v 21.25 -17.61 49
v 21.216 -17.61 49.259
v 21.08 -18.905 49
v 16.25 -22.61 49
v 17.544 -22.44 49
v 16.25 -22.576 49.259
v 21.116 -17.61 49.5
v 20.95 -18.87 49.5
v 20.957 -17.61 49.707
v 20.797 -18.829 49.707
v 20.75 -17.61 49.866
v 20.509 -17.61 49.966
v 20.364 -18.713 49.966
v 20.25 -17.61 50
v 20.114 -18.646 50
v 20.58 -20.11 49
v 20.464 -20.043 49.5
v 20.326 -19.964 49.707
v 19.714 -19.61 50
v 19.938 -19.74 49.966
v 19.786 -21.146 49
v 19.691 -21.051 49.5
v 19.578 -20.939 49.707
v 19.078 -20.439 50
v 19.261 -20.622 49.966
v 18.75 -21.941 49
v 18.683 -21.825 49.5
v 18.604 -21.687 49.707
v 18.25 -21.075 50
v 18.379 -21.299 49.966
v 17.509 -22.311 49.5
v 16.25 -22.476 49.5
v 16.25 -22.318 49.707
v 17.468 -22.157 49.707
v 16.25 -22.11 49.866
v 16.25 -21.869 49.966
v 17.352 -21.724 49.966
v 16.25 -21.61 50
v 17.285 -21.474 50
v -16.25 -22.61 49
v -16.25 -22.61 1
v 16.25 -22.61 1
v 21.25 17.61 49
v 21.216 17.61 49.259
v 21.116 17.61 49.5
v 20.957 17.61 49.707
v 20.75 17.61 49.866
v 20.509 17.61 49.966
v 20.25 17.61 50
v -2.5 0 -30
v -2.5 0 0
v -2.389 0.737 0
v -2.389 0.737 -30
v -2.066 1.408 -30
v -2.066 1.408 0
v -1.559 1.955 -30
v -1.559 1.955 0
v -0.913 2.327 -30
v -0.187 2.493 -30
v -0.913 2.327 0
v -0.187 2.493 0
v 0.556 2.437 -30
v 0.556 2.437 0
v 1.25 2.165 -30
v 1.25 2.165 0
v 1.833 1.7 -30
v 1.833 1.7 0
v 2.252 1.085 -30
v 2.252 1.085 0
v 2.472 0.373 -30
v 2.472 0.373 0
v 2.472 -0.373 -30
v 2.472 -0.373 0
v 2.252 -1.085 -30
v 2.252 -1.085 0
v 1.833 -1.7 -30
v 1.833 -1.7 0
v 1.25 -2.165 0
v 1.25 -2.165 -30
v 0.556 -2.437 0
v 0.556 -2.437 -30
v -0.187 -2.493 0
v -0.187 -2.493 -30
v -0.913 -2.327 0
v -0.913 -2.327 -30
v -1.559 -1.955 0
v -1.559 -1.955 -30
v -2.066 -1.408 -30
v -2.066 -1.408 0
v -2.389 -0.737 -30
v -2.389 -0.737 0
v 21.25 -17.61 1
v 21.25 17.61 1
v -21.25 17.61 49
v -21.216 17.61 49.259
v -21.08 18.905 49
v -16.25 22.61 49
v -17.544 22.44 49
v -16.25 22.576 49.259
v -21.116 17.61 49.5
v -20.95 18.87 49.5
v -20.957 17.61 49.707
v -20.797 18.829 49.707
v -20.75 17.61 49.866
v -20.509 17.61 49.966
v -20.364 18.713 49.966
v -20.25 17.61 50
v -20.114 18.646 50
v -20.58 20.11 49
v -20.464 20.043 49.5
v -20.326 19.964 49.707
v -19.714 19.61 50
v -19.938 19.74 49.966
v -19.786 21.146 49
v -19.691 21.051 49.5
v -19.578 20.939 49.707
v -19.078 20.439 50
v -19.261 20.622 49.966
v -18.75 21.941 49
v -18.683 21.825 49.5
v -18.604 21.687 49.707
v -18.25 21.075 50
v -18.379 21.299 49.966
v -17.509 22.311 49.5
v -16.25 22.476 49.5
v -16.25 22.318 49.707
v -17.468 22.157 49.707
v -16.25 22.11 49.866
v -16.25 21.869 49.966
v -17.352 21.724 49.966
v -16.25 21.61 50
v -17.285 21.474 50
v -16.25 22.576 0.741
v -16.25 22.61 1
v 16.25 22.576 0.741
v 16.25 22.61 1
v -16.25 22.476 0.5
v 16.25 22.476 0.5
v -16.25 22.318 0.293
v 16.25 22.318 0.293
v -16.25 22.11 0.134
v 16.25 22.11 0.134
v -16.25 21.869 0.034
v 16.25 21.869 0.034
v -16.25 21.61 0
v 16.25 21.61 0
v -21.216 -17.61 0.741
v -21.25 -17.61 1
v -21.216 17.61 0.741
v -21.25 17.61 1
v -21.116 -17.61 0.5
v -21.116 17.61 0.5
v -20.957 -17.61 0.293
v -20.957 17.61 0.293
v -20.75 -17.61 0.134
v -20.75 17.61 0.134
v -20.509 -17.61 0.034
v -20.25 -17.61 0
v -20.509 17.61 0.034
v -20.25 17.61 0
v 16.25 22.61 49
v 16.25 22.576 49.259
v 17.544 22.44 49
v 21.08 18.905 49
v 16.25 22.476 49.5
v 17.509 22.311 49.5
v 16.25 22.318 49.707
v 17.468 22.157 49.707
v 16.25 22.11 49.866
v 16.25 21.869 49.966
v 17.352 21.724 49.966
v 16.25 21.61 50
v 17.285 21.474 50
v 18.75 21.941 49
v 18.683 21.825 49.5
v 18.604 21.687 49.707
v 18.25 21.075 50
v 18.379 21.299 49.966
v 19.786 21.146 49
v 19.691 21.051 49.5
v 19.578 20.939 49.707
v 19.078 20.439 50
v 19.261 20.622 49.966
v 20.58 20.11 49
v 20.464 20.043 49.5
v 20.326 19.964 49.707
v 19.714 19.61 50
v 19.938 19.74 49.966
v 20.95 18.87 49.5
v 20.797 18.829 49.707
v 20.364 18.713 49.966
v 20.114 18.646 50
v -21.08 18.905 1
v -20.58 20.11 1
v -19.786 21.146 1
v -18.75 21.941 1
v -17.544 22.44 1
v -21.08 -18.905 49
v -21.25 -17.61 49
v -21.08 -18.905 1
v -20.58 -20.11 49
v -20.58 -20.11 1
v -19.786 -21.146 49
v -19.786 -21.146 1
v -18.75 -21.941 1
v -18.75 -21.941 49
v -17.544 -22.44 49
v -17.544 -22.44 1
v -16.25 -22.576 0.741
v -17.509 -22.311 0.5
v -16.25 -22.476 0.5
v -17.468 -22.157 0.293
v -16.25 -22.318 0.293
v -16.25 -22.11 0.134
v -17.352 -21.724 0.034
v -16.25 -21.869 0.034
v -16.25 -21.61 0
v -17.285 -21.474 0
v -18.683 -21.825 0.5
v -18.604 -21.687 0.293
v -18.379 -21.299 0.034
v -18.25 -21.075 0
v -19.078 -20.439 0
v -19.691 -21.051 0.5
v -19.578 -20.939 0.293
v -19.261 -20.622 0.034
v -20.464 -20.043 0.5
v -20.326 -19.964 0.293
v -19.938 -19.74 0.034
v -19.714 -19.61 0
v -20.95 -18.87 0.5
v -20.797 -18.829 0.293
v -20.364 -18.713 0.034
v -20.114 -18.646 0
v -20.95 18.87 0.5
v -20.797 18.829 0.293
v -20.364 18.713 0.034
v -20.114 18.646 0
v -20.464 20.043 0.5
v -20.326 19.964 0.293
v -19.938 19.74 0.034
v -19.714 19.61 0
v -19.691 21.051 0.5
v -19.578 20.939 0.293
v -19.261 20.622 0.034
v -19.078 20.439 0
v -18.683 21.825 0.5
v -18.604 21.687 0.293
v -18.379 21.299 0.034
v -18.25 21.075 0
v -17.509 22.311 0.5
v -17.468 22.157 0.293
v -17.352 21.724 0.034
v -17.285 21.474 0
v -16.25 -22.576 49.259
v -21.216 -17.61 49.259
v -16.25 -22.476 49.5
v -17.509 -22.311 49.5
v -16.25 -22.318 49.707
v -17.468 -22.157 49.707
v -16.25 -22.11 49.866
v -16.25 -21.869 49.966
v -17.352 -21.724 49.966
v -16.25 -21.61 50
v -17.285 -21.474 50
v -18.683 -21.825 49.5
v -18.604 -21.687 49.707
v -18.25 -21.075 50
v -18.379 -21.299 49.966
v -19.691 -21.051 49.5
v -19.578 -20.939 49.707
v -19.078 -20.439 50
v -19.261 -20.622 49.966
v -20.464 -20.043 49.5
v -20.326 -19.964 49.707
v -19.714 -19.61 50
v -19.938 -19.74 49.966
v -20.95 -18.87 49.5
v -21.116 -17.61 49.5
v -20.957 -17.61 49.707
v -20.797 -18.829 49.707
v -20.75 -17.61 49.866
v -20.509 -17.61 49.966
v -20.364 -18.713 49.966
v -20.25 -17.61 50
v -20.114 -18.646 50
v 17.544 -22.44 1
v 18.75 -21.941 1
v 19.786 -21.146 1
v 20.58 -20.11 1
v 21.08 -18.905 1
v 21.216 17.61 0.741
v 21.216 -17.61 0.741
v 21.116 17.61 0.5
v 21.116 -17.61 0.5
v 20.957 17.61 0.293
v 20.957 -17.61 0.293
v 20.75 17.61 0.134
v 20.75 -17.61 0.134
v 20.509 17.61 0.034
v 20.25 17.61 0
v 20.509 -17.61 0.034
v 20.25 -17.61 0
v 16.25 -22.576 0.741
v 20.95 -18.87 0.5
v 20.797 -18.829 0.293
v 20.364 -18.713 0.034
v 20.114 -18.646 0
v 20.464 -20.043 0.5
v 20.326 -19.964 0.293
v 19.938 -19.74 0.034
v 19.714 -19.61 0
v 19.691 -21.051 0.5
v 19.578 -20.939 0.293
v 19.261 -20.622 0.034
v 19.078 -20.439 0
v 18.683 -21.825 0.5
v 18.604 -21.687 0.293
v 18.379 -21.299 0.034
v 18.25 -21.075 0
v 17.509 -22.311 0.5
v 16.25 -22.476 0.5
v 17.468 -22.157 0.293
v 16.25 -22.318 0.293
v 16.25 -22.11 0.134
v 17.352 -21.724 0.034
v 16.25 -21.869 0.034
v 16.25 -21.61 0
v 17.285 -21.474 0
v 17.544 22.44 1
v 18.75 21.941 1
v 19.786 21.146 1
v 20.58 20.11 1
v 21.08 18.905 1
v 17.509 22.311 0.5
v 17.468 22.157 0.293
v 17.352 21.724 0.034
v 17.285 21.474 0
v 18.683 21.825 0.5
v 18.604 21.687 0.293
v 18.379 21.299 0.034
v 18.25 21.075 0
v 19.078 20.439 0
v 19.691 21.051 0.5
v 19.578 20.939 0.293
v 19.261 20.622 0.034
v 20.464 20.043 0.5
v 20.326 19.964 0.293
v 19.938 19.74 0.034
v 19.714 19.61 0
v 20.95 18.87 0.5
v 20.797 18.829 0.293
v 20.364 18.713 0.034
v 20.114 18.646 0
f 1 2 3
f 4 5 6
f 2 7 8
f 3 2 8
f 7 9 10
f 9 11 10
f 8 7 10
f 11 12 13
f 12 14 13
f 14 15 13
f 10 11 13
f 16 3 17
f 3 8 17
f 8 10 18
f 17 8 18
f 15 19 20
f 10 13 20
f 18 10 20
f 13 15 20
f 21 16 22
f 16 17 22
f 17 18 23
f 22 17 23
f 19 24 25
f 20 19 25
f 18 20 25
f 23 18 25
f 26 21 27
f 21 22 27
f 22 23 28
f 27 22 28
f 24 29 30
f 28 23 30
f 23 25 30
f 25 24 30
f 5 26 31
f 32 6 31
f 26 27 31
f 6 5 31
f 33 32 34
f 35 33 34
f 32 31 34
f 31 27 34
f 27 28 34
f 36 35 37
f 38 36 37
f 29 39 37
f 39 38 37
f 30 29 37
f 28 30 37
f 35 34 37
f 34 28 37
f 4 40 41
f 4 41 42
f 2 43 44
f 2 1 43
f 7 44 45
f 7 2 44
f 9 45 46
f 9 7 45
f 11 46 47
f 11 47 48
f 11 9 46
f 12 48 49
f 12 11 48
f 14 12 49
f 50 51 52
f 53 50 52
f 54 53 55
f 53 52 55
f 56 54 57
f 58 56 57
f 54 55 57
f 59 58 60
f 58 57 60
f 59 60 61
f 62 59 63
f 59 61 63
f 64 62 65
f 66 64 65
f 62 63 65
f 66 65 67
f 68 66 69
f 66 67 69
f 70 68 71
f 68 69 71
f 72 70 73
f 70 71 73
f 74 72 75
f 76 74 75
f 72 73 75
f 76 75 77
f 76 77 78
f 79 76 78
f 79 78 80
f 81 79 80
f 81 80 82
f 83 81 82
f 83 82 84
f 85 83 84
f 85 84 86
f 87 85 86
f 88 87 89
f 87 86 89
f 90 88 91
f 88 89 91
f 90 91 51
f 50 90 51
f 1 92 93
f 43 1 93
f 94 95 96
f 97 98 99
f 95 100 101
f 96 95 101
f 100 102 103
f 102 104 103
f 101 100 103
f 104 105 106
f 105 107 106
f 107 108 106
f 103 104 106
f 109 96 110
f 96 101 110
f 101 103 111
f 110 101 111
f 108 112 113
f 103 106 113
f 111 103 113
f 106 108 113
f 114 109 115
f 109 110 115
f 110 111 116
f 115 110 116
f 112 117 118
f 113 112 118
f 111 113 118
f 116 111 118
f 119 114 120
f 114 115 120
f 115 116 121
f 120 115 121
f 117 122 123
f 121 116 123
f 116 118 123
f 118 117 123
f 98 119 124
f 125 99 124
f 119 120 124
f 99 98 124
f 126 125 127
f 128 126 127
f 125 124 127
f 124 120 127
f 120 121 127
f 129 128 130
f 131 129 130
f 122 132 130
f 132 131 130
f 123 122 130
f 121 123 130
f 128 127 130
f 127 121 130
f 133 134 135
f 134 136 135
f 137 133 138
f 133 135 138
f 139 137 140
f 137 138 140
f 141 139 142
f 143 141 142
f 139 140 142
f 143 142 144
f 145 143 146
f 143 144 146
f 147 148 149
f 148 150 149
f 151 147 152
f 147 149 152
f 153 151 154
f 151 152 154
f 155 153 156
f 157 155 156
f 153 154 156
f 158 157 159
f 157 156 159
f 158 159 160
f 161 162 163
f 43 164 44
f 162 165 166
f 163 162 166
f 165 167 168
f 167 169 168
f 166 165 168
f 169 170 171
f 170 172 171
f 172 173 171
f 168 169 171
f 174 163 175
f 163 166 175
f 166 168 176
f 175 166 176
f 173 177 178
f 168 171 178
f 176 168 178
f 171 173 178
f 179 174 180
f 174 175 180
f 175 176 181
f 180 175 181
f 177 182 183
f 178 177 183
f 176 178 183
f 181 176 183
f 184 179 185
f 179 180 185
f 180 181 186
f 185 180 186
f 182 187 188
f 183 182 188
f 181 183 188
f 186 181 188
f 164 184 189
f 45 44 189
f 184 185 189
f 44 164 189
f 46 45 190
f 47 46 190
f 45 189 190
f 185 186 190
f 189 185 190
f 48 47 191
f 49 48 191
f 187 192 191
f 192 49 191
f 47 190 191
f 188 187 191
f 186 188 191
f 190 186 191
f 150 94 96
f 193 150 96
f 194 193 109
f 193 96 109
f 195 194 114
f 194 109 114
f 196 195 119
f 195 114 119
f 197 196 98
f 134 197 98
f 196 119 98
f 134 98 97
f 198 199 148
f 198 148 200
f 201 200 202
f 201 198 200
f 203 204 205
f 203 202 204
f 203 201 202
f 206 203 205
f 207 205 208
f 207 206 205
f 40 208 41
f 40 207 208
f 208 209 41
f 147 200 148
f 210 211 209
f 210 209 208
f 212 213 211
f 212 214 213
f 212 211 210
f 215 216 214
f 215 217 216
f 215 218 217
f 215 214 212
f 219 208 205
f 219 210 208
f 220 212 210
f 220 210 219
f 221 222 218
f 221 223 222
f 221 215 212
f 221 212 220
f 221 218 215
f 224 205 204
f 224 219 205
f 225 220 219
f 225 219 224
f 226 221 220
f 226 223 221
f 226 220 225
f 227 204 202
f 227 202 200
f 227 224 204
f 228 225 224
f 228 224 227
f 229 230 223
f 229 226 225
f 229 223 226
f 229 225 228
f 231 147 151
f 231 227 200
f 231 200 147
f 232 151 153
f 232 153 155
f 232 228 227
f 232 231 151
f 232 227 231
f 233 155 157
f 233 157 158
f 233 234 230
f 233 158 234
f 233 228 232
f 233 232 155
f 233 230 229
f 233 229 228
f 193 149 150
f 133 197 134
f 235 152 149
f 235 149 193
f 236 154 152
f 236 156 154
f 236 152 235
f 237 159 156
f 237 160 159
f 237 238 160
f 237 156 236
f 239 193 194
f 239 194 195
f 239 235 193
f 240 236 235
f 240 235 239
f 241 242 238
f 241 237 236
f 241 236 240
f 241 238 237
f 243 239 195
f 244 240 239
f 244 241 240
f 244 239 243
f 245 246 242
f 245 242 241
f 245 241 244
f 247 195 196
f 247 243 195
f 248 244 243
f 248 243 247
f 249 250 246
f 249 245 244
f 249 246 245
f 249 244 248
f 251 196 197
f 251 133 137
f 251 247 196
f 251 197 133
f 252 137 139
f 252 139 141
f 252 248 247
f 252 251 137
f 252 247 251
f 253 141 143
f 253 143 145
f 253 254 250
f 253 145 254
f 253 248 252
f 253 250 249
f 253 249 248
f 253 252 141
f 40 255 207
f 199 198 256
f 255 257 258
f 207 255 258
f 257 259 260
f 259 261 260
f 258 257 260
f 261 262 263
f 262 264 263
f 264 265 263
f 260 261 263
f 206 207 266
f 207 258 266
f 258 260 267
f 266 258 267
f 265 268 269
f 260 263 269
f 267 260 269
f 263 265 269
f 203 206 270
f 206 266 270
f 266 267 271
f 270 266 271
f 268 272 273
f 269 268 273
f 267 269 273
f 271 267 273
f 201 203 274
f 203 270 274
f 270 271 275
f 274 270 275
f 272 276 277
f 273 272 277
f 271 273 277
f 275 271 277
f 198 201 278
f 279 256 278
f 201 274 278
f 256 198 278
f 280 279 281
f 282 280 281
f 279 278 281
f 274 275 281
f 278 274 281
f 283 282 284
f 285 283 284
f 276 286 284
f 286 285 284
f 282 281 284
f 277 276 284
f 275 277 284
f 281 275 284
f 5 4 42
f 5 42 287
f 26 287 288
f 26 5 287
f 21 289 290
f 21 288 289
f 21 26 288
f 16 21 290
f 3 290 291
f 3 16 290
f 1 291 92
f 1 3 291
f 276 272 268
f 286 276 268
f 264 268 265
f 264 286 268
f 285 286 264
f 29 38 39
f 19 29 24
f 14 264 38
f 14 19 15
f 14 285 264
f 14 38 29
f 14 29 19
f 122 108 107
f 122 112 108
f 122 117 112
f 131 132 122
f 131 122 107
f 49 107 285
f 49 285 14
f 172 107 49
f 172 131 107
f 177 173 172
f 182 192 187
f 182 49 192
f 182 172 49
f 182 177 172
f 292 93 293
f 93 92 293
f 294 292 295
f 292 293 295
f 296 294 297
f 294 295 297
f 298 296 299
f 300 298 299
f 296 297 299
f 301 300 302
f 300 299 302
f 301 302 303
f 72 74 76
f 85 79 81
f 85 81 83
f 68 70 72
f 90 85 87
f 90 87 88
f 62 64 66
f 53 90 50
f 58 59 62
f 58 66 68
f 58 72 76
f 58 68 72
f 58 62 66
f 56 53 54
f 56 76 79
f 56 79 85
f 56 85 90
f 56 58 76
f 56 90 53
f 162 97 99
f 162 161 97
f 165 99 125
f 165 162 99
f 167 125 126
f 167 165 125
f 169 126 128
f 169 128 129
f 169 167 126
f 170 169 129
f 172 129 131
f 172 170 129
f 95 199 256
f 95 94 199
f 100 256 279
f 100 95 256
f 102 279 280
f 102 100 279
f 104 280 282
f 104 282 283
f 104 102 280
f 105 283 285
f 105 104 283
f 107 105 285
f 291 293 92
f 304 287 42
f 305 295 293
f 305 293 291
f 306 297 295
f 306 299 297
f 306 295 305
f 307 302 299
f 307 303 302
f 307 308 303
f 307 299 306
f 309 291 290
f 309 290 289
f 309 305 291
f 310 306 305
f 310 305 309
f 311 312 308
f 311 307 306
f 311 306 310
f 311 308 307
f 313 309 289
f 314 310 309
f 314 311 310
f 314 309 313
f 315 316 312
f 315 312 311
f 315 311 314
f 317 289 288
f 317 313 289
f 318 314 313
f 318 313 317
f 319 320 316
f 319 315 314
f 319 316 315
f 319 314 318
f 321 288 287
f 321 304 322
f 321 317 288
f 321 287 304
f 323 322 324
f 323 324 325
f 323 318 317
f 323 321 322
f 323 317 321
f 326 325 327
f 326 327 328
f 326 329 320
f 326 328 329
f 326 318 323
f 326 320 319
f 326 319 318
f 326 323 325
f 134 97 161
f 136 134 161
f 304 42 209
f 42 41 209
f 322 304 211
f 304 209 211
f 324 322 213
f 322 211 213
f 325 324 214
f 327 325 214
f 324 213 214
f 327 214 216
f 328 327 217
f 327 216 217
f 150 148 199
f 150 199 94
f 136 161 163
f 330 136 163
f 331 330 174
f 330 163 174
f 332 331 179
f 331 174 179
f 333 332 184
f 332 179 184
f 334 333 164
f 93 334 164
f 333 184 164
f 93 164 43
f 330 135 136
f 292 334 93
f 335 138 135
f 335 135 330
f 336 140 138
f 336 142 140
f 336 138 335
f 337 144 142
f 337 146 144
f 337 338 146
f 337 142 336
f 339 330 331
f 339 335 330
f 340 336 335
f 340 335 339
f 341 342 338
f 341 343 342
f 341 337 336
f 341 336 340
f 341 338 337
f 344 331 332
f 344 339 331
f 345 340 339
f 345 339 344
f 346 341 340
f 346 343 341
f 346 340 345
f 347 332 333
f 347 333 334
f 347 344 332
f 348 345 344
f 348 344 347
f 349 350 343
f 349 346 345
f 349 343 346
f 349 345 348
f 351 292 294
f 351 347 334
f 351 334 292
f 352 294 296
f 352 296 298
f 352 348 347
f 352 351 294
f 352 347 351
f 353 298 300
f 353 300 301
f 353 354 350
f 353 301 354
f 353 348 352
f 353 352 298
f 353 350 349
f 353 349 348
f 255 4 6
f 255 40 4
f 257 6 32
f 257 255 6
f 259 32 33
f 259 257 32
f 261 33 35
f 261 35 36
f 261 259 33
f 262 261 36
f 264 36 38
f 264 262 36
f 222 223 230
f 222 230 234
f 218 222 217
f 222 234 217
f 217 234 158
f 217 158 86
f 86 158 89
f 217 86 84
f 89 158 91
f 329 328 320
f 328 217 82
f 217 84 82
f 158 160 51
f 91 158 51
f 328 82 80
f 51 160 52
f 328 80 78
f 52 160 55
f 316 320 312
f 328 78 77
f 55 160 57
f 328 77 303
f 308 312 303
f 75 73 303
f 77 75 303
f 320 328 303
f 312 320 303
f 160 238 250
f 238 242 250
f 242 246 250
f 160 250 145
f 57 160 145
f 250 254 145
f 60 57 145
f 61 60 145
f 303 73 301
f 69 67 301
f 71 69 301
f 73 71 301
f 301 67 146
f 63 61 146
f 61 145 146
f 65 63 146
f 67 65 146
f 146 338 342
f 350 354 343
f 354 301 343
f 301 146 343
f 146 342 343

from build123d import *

# Parameters (mm, degrees)
ESQUISSE1_W        = 42.5
ESQUISSE1_H        = 45.220937172
BOSS_EXTRU_1_DEPTH = 50
ESQUISSE2_R        = 2.5
BOSS_EXTRU_2_DEPTH = 30
CONG_1_R           = 5
CONG_2_R           = 1
CONG_3_R           = 1


with BuildPart() as part:
    # Esquisse1 → Boss.-Extru.1 (new body)
    with BuildSketch(Plane.XY):
        Rectangle(ESQUISSE1_W, ESQUISSE1_H)
    extrude(amount=BOSS_EXTRU_1_DEPTH)

    # Esquisse2 → Boss.-Extru.2 (add)
    with BuildSketch(Plane(origin=(0, 0, 0), x_dir=(-1, 0, 0), z_dir=(0, 0, -1))):
        Circle(ESQUISSE2_R)
    extrude(amount=BOSS_EXTRU_2_DEPTH)

    # Congé1
    cong_1_edges = [part.edges().sort_by_distance(p)[0] for p in [
        (21.25, -22.610468586, 25),
        (-21.25, -22.610468586, 25),
        (-21.25, 22.610468586, 25),
        (21.25, 22.610468586, 25),
    ]]
    fillet(cong_1_edges, radius=CONG_1_R)

    # Congé2
    cong_2_edges = [part.edges().sort_by_distance(p)[0] for p in [
        (-21.25, 0, 50),
        (0, 22.610468586, 50),
        (21.25, 0, 50),
        (0, -22.610468586, 50),
        (19.785533906, 21.146002492, 50),
        (19.785533906, -21.146002492, 50),
        (-19.785533906, -21.146002492, 50),
        (-19.785533906, 21.146002492, 50),
    ]]
    fillet(cong_2_edges, radius=CONG_2_R)

    # Congé3
    cong_3_edges = [part.edges().sort_by_distance(p)[0] for p in [
        (-21.25, 0, 0),
        (21.25, 0, 0),
        (0, -22.610468586, 0),
        (0, 22.610468586, 0),
        (19.785533906, 21.146002492, 0),
        (19.785533906, -21.146002492, 0),
        (-19.785533906, -21.146002492, 0),
        (-19.785533906, 21.146002492, 0),
    ]]
    fillet(cong_3_edges, radius=CONG_3_R)


solid = part.part
